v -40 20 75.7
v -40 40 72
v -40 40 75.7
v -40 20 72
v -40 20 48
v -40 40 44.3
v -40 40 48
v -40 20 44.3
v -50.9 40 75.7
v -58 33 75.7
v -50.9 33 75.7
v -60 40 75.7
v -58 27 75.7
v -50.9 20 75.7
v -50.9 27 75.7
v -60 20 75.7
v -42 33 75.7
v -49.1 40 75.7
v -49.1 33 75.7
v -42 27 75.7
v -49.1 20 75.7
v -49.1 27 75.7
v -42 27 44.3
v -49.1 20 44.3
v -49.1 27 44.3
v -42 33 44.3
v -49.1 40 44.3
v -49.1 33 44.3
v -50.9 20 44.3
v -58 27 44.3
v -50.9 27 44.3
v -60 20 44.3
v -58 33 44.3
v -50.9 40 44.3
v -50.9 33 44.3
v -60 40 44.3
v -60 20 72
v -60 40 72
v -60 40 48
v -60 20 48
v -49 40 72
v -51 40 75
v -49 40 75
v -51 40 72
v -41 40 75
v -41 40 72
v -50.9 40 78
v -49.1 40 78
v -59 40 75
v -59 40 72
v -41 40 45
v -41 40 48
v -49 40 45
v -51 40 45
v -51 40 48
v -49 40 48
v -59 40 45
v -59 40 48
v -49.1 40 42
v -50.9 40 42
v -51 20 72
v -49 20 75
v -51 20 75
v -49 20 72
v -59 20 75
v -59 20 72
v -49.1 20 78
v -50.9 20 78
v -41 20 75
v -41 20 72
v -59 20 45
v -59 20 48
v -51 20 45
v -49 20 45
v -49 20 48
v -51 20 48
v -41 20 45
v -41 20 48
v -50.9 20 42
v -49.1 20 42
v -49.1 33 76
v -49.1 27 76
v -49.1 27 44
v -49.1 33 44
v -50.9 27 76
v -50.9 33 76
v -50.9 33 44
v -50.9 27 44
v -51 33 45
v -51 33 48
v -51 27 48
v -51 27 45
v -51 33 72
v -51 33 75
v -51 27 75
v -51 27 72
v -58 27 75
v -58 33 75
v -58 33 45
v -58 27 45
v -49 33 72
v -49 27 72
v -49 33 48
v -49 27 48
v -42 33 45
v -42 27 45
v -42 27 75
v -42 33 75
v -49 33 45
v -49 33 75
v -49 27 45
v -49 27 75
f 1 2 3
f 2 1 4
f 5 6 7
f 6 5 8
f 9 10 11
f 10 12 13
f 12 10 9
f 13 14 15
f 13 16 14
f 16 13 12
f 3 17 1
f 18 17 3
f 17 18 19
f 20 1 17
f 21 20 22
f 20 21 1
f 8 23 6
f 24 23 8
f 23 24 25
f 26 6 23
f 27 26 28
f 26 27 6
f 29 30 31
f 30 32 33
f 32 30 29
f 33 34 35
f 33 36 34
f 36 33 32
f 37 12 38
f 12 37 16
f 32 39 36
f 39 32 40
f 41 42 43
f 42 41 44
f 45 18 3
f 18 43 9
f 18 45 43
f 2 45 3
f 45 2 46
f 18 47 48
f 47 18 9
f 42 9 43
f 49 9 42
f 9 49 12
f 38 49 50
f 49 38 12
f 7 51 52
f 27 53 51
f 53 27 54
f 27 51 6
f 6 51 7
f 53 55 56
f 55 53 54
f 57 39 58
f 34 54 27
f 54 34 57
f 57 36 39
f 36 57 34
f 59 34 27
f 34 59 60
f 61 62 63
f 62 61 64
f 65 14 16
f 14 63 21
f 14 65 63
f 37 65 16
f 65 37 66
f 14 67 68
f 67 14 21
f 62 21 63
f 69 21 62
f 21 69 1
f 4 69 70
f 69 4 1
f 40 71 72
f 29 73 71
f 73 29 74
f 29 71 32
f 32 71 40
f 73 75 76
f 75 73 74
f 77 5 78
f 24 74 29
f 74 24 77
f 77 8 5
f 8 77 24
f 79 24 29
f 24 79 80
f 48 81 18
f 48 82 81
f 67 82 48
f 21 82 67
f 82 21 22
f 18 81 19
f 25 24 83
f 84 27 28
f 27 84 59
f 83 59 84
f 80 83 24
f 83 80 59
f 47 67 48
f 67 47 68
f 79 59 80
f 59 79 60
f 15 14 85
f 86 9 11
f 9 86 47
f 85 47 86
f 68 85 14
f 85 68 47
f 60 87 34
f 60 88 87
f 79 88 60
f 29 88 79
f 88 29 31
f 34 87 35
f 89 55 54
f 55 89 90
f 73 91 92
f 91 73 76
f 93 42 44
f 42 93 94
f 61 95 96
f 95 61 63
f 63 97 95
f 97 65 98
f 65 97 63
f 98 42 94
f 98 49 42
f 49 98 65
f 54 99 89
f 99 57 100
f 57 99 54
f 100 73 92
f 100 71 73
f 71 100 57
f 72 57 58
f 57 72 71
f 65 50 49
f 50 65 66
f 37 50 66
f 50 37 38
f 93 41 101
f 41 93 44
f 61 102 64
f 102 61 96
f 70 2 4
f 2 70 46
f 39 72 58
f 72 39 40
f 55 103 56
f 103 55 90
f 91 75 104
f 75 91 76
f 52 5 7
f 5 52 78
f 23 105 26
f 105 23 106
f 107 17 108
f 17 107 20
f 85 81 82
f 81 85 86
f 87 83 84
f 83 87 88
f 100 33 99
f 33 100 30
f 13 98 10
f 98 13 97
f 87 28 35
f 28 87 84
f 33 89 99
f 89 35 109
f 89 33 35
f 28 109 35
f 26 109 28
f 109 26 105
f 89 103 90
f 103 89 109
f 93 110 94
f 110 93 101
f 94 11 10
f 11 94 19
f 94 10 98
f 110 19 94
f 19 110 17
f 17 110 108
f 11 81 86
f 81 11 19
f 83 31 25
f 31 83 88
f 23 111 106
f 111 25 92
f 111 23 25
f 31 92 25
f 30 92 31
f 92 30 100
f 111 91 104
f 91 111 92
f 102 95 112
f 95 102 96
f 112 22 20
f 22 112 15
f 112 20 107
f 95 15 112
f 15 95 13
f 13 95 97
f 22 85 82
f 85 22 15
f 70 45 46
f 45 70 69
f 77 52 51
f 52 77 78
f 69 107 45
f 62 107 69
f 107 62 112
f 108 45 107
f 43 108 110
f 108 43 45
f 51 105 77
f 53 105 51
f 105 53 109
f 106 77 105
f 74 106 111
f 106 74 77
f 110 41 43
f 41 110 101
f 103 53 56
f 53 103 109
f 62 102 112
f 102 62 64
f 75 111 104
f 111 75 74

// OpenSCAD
module kuangkuang(sizex, sizey, sizez){
    difference(){
    translate([0,0,sizez/2])cube([sizex+2,sizey+2,sizez],center=true);
    translate([0,0,sizez/2])cube([sizex+0.01,sizey+0.01,sizez+0.01],center=true);
    translate([0,0,sizez/2])cube([sizex-6+0.01,sizey+2.01,sizez+0.01],center=true);
    translate([0,0,sizez/2])cube([sizex+2.01,sizey-6+0.01,sizez+0.01],center=true);
    }
}

module addon(){
    difference(){
        cylinder(2, r=4.9,center=true,$fn=50);
        cylinder(2.01, r=2.5,center=true,$fn=50);
        translate([-2.5,-2.5,0])cube([5.1,5.1,2.01],center=true);
        translate([ 2.5, 2.5,0])cube([5.1,5.1,2.01],center=true);
    }
}
module conn(height,degree){
    difference(){
        cube([height,40,20],center=true);
        cube([height-4,36,22],center=true);
        //translate([0,0,1])cube([32,36,18.01],center=true);
        //translate([0,0,5])cube([20,41,10],center=true);
        translate([0, 10,0])rotate([0,90,0])cylinder(40.01, r=2.5,center=true,$fn=50);
        translate([0,-10,0])rotate([0,90,0])cylinder(40.01, r=2.5,center=true,$fn=50);
    }
    translate([-height/2-1, 10,0])rotate([0,90,0])rotate([0,0,degree])addon();
    translate([-height/2-1,-10,0])rotate([0,90,0])rotate([0,0,degree])addon();
    translate([ height/2+1, 10,0])rotate([0,90,0])rotate([0,0,degree])addon();
    translate([ height/2+1,-10,0])rotate([0,90,0])rotate([0,0,degree])addon();
}
module conn_typec(){
    difference(){
    union(){
    conn(40,-45);
    //layer2
    translate([5,0,0])cube([10,40,20],center=true);
    //layer1
    translate([-5,0,0])cube([10,40,20],center=true);
    }

    //layer2
    translate([5.5,-10,9])cube([9.01,4,2.01],center=true);
    translate([5.5,-10,0])cube([9.01,8,16.01],center=true);
    translate([5.5,-10,-9])cube([9.01,4,2.01],center=true);
    translate([5.5, 10, 9])cube([9.01,4,2.01],center=true);
    translate([5.5, 10,0])cube([9.01,8,16.01],center=true);
    translate([5.5, 10,-9])cube([9.01,4,2.01],center=true);

    //layer1
    translate([5.5-10, 0, 0])cube([9.01,36,20.01],center=true);
    }
}
module conn_xh254(){
    difference(){
    union(){
    //+special
    translate([-10,-11,5])cube([20,2,10], center=true);
    //xh254
    translate([0,0,5])cube([40,20,10],center=true);
    //+blank
    translate([0,0,-5])cube([40,20,10],center=true);
    //+main
    rotate([0,90,90])conn(40,-45);
    }

    //-blank
    translate([0,0,-4.5])cube([36,21,9],center=true);

    //-xh254.chargerside
    //.special+++
    translate([-10,9+0.5, 5.5])cube([   6,1.01,9.01],center=true);
    //translate([-10,9+0.5, 9])cube([12.4,1.01,2.01],center=true);
    translate([-10,8+0.5, 5.5])cube([12.4,1.01,9.01],center=true);
    //.special---
    //normal
    translate([-10,  -2+0.5, 5.5])cube([12.4,19,9.01],center=true);
    translate([-10,-12+0.5, 5.5])cube([9,1.01,9.01],center=true);

    //-xh254.batteryside
    translate([ 10,10-3/2, 5+2])cube([6,3.01,6.01],center=true);
    translate([ 10,0, 5+1])cube([8.2,15,8.01],center=true);
    translate([ 10,0-15/2+7/2, 5+1])cube([10.0,7.01,8.01],center=true);
    translate([ 10,0-15/2-0.5, 5+1])cube([8.0,1,8.01],center=true);
    translate([ 10,-9.01, 5.4])cube([13,2,9.21],center=true);
    }
}
module conn_ear(){
    difference(){
        conn(36,-45);
        translate([0,0,5.01])cube([20,40.01,10],center=true);
    }
}

module conn_motor(){
    difference(){
        conn(36,45);
        translate([0,0,5.01])cube([20,40.01,10],center=true);
    }
}

module top_top(){
    /*
    translate([-40, 20, 80-0.5])linear_extrude(height=1.01,center=true)text("-A-",size=20,font= "Arial");
    translate([00, 20, 80-0.5])linear_extrude(height=1.01,center=true)text("-B-",size=20,font= "Arial");
    translate([-40,-40, 80-0.5])linear_extrude(height=1.01,center=true)text("-C-",size=20,font= "Arial");
    translate([00,-40, 80-0.5])linear_extrude(height=1.01,center=true)text("-D-",size=20,font= "Arial");
    */

    difference(){
    union(){
    translate([0, 0, 80-1])cube([120,120,2],center=true);
    }

    //middle
    translate([0, 0, 80-1.11])cube([80,80,1.8],center=true);
    translate([0, 0, 80-1])cube([40,40,3],center=true);

    //hole
    translate([-50,-10,80])cylinder(100, r=5,center=true,$fn=50);
    translate([-50, 10,80])cylinder(100, r=5,center=true,$fn=50);
    translate([ 50,-10,80])cylinder(100, r=5,center=true,$fn=50);
    translate([ 50, 10,80])cylinder(100, r=5,center=true,$fn=50);

    //cam
    translate([-40, 40, 80])cube([20,30,8],center=true);
    translate([ 40, 40, 80])cube([20,30,8],center=true);
    translate([-40,-40, 80])cube([20,30,8],center=true);
    translate([ 40,-40, 80])cube([20,30,8],center=true);
    }

    //speaker
    difference(){
    union(){
    translate([-40, 40, 80-4.5])cube([22,32,9],center=true);
    translate([ 40, 40, 80-4.5])cube([22,32,9],center=true);
    translate([-40,-40, 80-4.5])cube([22,32,9],center=true);
    translate([ 40,-40, 80-4.5])cube([22,32,9],center=true);
    }

    //cam
    translate([-40, 40, 80.01-4])cube([20,30,8],center=true);
    translate([ 40, 40, 80.01-4])cube([20,30,8],center=true);
    translate([-40,-40, 80.01-4])cube([20,30,8],center=true);
    translate([ 40,-40, 80.01-4])cube([20,30,8],center=true);

    //cam
    translate([-40, 40, 80.01-4])cube([10,40,8],center=true);
    translate([ 40, 40, 80.01-4])cube([10,40,8],center=true);
    translate([-40,-40, 80.01-4])cube([10,40,8],center=true);
    translate([ 40,-40, 80.01-4])cube([10,40,8],center=true);
    }
}

module top_support_speaker(){
    difference(){
    union(){
    translate([-50, 30,60])cube([20,20,32-0.6],center=true);
    translate([-50, 30,60])cube([1.8,20,36],center=true);
    }
//
    translate([-50-5, 30,60])cube([8,21,30],center=true);
    translate([-50-5, 30,60])cube([10,21,24],center=true);
//
    translate([-50  , 30,60])cube([16,6,32],center=true);
//
    translate([-50+5, 30,60])cube([8,21,30],center=true);
    translate([-50+5, 30,60])cube([10,21,24],center=true);
    }
}
module top_support_one(){
    difference(){
        conn(36,45);
        //translate([0,0,6])cube([40,24,2],center=true);
    }
    //speaker
    difference(){
        translate([0, 30,0])cube([36,20,20],center=true);
        translate([0, 30,0])cube([40,24,2],center=true);
        translate([0, 30,0])cube([32,20,31],center=true);
    }
    //micphone
    difference(){
    translate([0,-30,0])cube([36,20,20],center=true);
    translate([0,-30,0])cube([40,24,2],center=true);
    translate([0,-30,0])cube([28,20,31],center=true);
    }
}
module top_support(){
    top_support_speaker();
    translate([-50, 0, 60])rotate([0,90,0])top_support_one();
    translate([ 50, 0, 60])rotate([0,-90,0])top_support_one();
}

module rpi(){
difference(){
    union(){
    translate([-24.5,20-62, 1])cylinder(2, r=3,center=true,$fn=50);
    translate([ 24.5,20-62, 1])cylinder(2, r=3,center=true,$fn=50);
    translate([-24.5, 20-4, 1])cylinder(2, r=3,center=true,$fn=50);
    translate([ 24.5, 20-4, 1])cylinder(2, r=3,center=true,$fn=50);
    }
    translate([-24.5,20-62, 1])cylinder(4, r=1.6,center=true,$fn=50);
    translate([ 24.5,20-62, 1])cylinder(4, r=1.6,center=true,$fn=50);
    translate([-24.5, 20-4, 1])cylinder(4, r=1.6,center=true,$fn=50);
    translate([ 24.5, 20-4, 1])cylinder(4, r=1.6,center=true,$fn=50);
}
}
module notprint_rpi(){
translate([0,-20,60])cube([55,88,36-4],center=true);
}

module cam(){
difference(){
    cube([28,28,1.6],center=true);
    //middle
    translate([0,-2,0])cube([12,24,10],center=true);
    //edge
    //translate([-15,15,0])cube([10,4,10],center=true);
    //translate([ 15,15,0])cube([10,4,10],center=true);
    //hole
    translate([-21/2,4-12.5,0])cylinder(110, r=1.2,center=true,$fn=50);
    translate([ 21/2,4-12.5,0])cylinder(110, r=1.2,center=true,$fn=50);
    translate([-21/2, 4,0])cylinder(110, r=1.2,center=true,$fn=50);
    translate([ 21/2, 4,0])cylinder(110, r=1.2,center=true,$fn=50);
}
}
module cam_bottom(){
    difference(){
        translate([0,50,42+2])cube([20,20,4],center=true);
        translate([0,50,42+1.1])cube([50,10,2.2],center=true);
        translate([0,50,0.5])cylinder(100, r=1.6,center=true,$fn=50);
        translate([0,58,42+3])cube([100,2,2],center=true);
    }
}
module cam_mount(){
    translate([0,60-0.8,56])rotate([90,0,0])cam();
    cam_bottom();
}
module top_cam(){
translate([-30,0.0])cam_mount();
translate([ 30,0.0])cam_mount();
}
/*
module top_speaker_l(){
difference(){
    translate([-55, 50,60])cube([10,20,36],center=true);
    translate([-50, 46,61])cube([21,8,30],center=true);
    translate([-50, 60,61])cube([21,20,28],center=true);
    translate([-50,50,43.2])cube([50,10,2.4],center=true);

    translate([-55,50,47])cylinder(4, r=3,center=true,$fn=50);
    translate([-55,50,50])cylinder(30, r=1.6,center=true,$fn=50);

    translate([-52, 46,80])cube([4,8,10],center=true);
}
}
module top_speaker_r(){
difference(){
    translate([ 55, 50,60])cube([10,20,36],center=true);
    translate([ 50, 46,61])cube([21,8,30],center=true);
    translate([ 50, 60,61])cube([21,20,26],center=true);
    translate([ 50,50,43.2])cube([50,10,2.4],center=true);

    translate([ 55,50,47])cylinder(4, r=3,center=true,$fn=50);
    translate([ 55,50,50])cylinder(30, r=1.6,center=true,$fn=50);

    translate([ 52, 46,80])cube([4,8,10],center=true);
}
}
module top_speaker(){
    top_speaker_l();
    top_speaker_r();
}
*/
module inmp441(){
    translate([0,0,1])cube([20,40,2],center=true);
    translate([0,0,2+5])cube([2.54*3,2.54*4,10],center=true);
}
module top_mic(){
translate([ 40,0,60])rotate([0, 90,0])inmp441();
translate([-40,0,60])rotate([0,-90,0])inmp441();
}

module upper_real(){
    //+hole for cam
    difference(){
        translate([0,50,3-0.1])cube([108,9.8,2],center=true);
        for(j=[-50:5:50]){
            translate([j,50,0.5])cylinder(10, r=1.6,center=true,$fn=50);
        }
    }

    //+hole for rpi
    difference(){
        union(){
        translate([-24.5,20-62, 3])cylinder(2, r=4,center=true,$fn=50);
        translate([ 24.5,20-62, 3])cylinder(2, r=4,center=true,$fn=50);
        translate([-24.5, 20-4, 3])cylinder(2, r=4,center=true,$fn=50);
        translate([ 24.5, 20-4, 3])cylinder(2, r=4,center=true,$fn=50);
        }
        translate([-24.5,20-62, 3])cylinder(3, r=1.6,center=true,$fn=50);
        translate([ 24.5,20-62, 3])cylinder(3, r=1.6,center=true,$fn=50);
        translate([-24.5, 20-4, 3])cylinder(3, r=1.6,center=true,$fn=50);
        translate([ 24.5, 20-4, 3])cylinder(3, r=1.6,center=true,$fn=50);
    }

    difference(){
    translate([0,0,2/2])cube([120,120,2],center=true);

    //center
    //translate([0,0,2/2])cube([40,40,3],center=true);

    //leftright
    translate([-35,0,2/2])cube([10,40,3],center=true);
    translate([ 35,0,2/2])cube([10,40,3],center=true);

    //cammount
    for(j=[-50:5:50]){
    //translate([j,50,0.5])cylinder(10, r=1.6,center=true,$fn=50);
    translate([j,50,1])cylinder(2.01, r=3,center=true,$fn=50);
    }

    //rpi
    translate([-24.5,20-62, 1])cylinder(2.01, r=3,center=true,$fn=50);
    translate([ 24.5,20-62, 1])cylinder(2.01, r=3,center=true,$fn=50);
    translate([-24.5, 20-4, 1])cylinder(2.01, r=3,center=true,$fn=50);
    translate([ 24.5, 20-4, 1])cylinder(2.01, r=3,center=true,$fn=50);

    //support hole
    translate([-50,-10,0])cylinder(100, r=5,center=true,$fn=50);
    translate([-50, 10,0])cylinder(100, r=5,center=true,$fn=50);
    translate([ 50,-10,0])cylinder(100, r=5,center=true,$fn=50);
    translate([ 50, 10,0])cylinder(100, r=5,center=true,$fn=50);

    //translate([-20, 20,0])cylinder(100, r=1.6,center=true,$fn=50);
    //translate([  0, 20,0])cylinder(100, r=1.6,center=true,$fn=50);
    //translate([ 20, 20,0])cylinder(100, r=1.6,center=true,$fn=50);

    //marker line
    translate([0,-40,0.1])cube([120,0.2,0.21],center=true);
    translate([0,-20,0.1])cube([120,0.2,0.21],center=true);
    translate([0,  0,0.1])cube([120,0.2,0.21],center=true);
    translate([0, 20,0.1])cube([120,0.2,0.21],center=true);
    translate([0, 40,0.1])cube([120,0.2,0.21],center=true);
    translate([-40,0,0.1])cube([0.2,120,0.21],center=true);
    translate([-20,0,0.1])cube([0.2,120,0.21],center=true);
    translate([  0,0,0.1])cube([0.2,120,0.21],center=true);
    translate([ 20,0,0.1])cube([0.2,120,0.21],center=true);
    translate([ 40,0,0.1])cube([0.2,120,0.21],center=true);

    translate([0,-40,1.9])cube([120,0.2,0.21],center=true);
    translate([0,-20,1.9])cube([120,0.2,0.21],center=true);
    translate([0,  0,1.9])cube([120,0.2,0.21],center=true);
    translate([0, 20,1.9])cube([120,0.2,0.21],center=true);
    translate([0, 40,1.9])cube([120,0.2,0.21],center=true);
    translate([-40,0,1.9])cube([0.2,120,0.21],center=true);
    translate([-20,0,1.9])cube([0.2,120,0.21],center=true);
    translate([  0,0,1.9])cube([0.2,120,0.21],center=true);
    translate([ 20,0,1.9])cube([0.2,120,0.21],center=true);
    translate([ 40,0,1.9])cube([0.2,120,0.21],center=true);
}
}

module top_bot(){
//translate([0,0,2+40+2])rpi();

translate([0,0,40])upper_real();
}

module bezier(h){
linear_extrude(height=h)polygon([
    for(t=[0:0.1:1.0])    [20*t*t, 40*(1-t)*(1-t)],
    [0, 0]
    ]);
}

module batterydock(){
    difference(){
    cube([80,40,40],center=true);
    cube([76,40.02,40.02],center=true);
    }
}

module l298n(){
difference(){
    union(){
        translate([-27.5,20-60,2+2/2])cylinder(2, r=3,center=true,$fn=50);
        translate([ 27.5,20-60,2+2/2])cylinder(2, r=3,center=true,$fn=50);
        translate([-14.5, 20-6,2+2/2])cylinder(2, r=3,center=true,$fn=50);
        translate([ 14.5, 20-6,2+2/2])cylinder(2, r=3,center=true,$fn=50);
    }
        translate([-27.5,20-60,2+2/2])cylinder(10, r=1.6,center=true,$fn=50);
        translate([ 27.5,20-60,2+2/2])cylinder(10, r=1.6,center=true,$fn=50);
        translate([-14.5, 20-6,2+2/2])cylinder(10, r=1.6,center=true,$fn=50);
        translate([ 14.5, 20-6,2+2/2])cylinder(10, r=1.6,center=true,$fn=50);
}
}

module bottom(){
difference(){
    translate([0,0,2/2])cube([120,120,2],center=true);
    translate([0,0,0.6])cube([40, 80, 1.21],center=true);
    translate([0,-40+8,0])cube([40, 16, 10],center=true);
    translate([0, 40-8,0])cube([40, 16, 10],center=true);

    //screw hole
    translate([-50,-10,0])cylinder(100, r=2.5,center=true,$fn=50);
    translate([-50, 10,0])cylinder(100, r=2.5,center=true,$fn=50);
    translate([ 50,-10,0])cylinder(100, r=2.5,center=true,$fn=50);
    translate([ 50, 10,0])cylinder(100, r=2.5,center=true,$fn=50);

    //cable hole
    translate([-40+5/2, 0,0])cube([5,10,30],center=true,$fn=50);
    translate([ 40-5/2, 0,0])cube([5,10,30],center=true,$fn=50);

    //corner
    translate([-50.01,-40.01,2/2])cube([20,40,4],center=true);
    translate([ 50.01,-40.01,2/2])cube([20,40,4],center=true);
    translate([-50.01, 40.01,2/2])cube([20,40,4],center=true);
    translate([ 50.01, 40.01,2/2])cube([20,40,4],center=true);

    //hole
    //translate([-40,-20,0])cylinder(100, r=2.5,center=true,$fn=50);
    //translate([-40, 20,0])cylinder(100, r=2.5,center=true,$fn=50);
    //translate([ 40,-20,0])cylinder(100, r=2.5,center=true,$fn=50);
    //translate([ 40, 20,0])cylinder(100, r=2.5,center=true,$fn=50);

    //translate([-20, 20,0])cylinder(100, r=1.6,center=true,$fn=50);
    //translate([  0, 20,0])cylinder(100, r=1.6,center=true,$fn=50);
    //translate([ 20, 20,0])cylinder(100, r=1.6,center=true,$fn=50);

    //marker line
    translate([0,-40,0.1])cube([120,0.2,0.21],center=true);
    translate([0,-20,0.1])cube([120,0.2,0.21],center=true);
    translate([0,  0,0.1])cube([120,0.2,0.21],center=true);
    translate([0, 20,0.1])cube([120,0.2,0.21],center=true);
    translate([0, 40,0.1])cube([120,0.2,0.21],center=true);
    translate([-40,0,0.1])cube([0.2,120,0.21],center=true);
    translate([-20,0,0.1])cube([0.2,120,0.21],center=true);
    translate([  0,0,0.1])cube([0.2,120,0.21],center=true);
    translate([ 20,0,0.1])cube([0.2,120,0.21],center=true);
    translate([ 40,0,0.1])cube([0.2,120,0.21],center=true);

    translate([0,-40,1.9])cube([120,0.2,0.21],center=true);
    translate([0,-20,1.9])cube([120,0.2,0.21],center=true);
    translate([0,  0,1.9])cube([120,0.2,0.21],center=true);
    translate([0, 20,1.9])cube([120,0.2,0.21],center=true);
    translate([0, 40,1.9])cube([120,0.2,0.21],center=true);
    translate([-40,0,1.9])cube([0.2,120,0.21],center=true);
    translate([-20,0,1.9])cube([0.2,120,0.21],center=true);
    translate([  0,0,1.9])cube([0.2,120,0.21],center=true);
    translate([ 20,0,1.9])cube([0.2,120,0.21],center=true);
    translate([ 40,0,1.9])cube([0.2,120,0.21],center=true);

    //l298
    translate([-27.5,20-60,0.5])cylinder(1.01, r=2.5,center=true,$fn=50);
    translate([ 27.5,20-60,0.5])cylinder(1.01, r=2.5,center=true,$fn=50);
    translate([-14.5,20-6,0.5])cylinder(1.01, r=2.5,center=true,$fn=50);
    translate([ 14.5,20-6,0.5])cylinder(1.01, r=2.5,center=true,$fn=50);

    translate([-27.5,20-60,0])cylinder(10, r=1.6,center=true,$fn=50);
    translate([ 27.5,20-60,0])cylinder(10, r=1.6,center=true,$fn=50);
    translate([-14.5,20-6,0])cylinder(10, r=1.6,center=true,$fn=50);
    translate([ 14.5,20-6,0])cylinder(10, r=1.6,center=true,$fn=50);
}
}

module motorseat(){
difference(){
    translate([0, 0,0])cube([24,120,8],center=true);
    cube([26,70,20],center=true);

    //shaft hole
    translate([0, 60,0])cylinder(20, r=4,center=true,$fn=50);
    translate([0,-60,0])cylinder(20, r=4,center=true,$fn=50);

    //shaft hole
    translate([0, 60-11.5,0])cylinder(20, r=2.2,center=true,$fn=50);
    translate([0,-60+11.5,0])cylinder(20, r=2.2,center=true,$fn=50);

    //screw hole
    translate([-8.6, 60-21,0])cylinder(20, r=1.6,center=true,$fn=50);
    translate([ 8.6, 60-21,0])cylinder(20, r=1.6,center=true,$fn=50);
    translate([-8.6,-60+21,0])cylinder(20, r=1.6,center=true,$fn=50);
    translate([ 8.6,-60+21,0])cylinder(20, r=1.6,center=true,$fn=50);
}
}

module notprint_battery(){
    translate([ 0,40,20])cube([78,40,40],center=true);
}
module notprint_battery2(){
    translate([ 0,-40,20])cube([78,40,40],center=true);
}
module notprint_l298n(){
    translate([ 0,-20,10])cube([60,80,14],center=true);
}

module part2_kuang(){
    //shang
    difference(){
        union(){
        translate([-10, 40,1.2])cube([4,4,2.4],center=true);
        translate([  0, 40,1.2])cube([4,4,2.4],center=true);
        translate([ 10, 40,1.2])cube([4,4,2.4],center=true);
        translate([20,20,0])rotate([0,-90,0])bezier(40);
        translate([0,40,0.5])cube([40,40,1.0],center=true);
        }
        translate([-10,40,0])cylinder(10, r=1.6,center=true,$fn=50);
        translate([  0,40,0])cylinder(10, r=1.6,center=true,$fn=50);
        translate([ 10,40,0])cylinder(10, r=1.6,center=true,$fn=50);
    }
/*
    //zhong
    difference(){
        translate([0,0,10])cube([40,40,20],center=true);
        translate([0,0,10])cube([30,39.9,20.02],center=true);
        translate([0,10,10])rotate([0,90,0])cylinder(100, r=2.5,center=true,$fn=50);
        translate([0,-10,10])rotate([0,90,0])cylinder(100, r=2.5,center=true,$fn=50);
    }
*/
    //xia
    difference(){
        union(){
        translate([-10,-40,1.2])cube([4,4,2.4],center=true);
        translate([  0,-40,1.2])cube([4,4,2.4],center=true);
        translate([ 10,-40,1.2])cube([4,4,2.4],center=true);
        mirror([0,1,0])translate([20,20,0])rotate([0,-90,0])bezier(40);
        translate([0,-40,0.5])cube([40,40,1.0],center=true);
        }
        translate([-10,-40,0])cylinder(10, r=1.6,center=true,$fn=50);
        translate([  0,-40,0])cylinder(10, r=1.6,center=true,$fn=50);
        translate([ 10,-40,0])cylinder(10, r=1.6,center=true,$fn=50);
    }
}
module mid_kuang_right(){
    translate([40,0,20])rotate([0,90,0])part2_kuang();
    translate([50,0,20])rotate([0,0,90])conn_xh254();
}
module mid_kuang_left(){
    translate([-40,0,20])rotate([0,-90,0])part2_kuang();
    translate([-50,0,20])rotate([0,-90,0])conn_typec();
}

module bot_dipan(){
translate([ 0, 0,-2])bottom();
//l298n();

translate([ 40, 20,-2])bezier(2);
translate([ 40,-20,-2])mirror([0,1,0])bezier(2);
translate([-40, 20,-2])mirror([1,0,0])bezier(2);
translate([-40,-20,-2])rotate([0,0,180])bezier(2);
}
module bot_support(){
    translate([-50, 0,-20])rotate([0,90,0])conn_motor();
    translate([ 50, 0,-20])rotate([0,-90,0])conn_motor();
}



module wheel(){
    rotate([0,90,0])cylinder(25, r=65/2,center=true,$fn=50);
}
module notprint_wheel(){
    translate([-60,-60,-20])wheel();
    translate([ 60,-60,-20])wheel();
    translate([-60, 60,-20])wheel();
    translate([ 60, 60,-20])wheel();
}

module screwhelper()
{
difference(){
    cylinder(2, r=3,center=true,$fn=50);
    cylinder(4, r=1.8,center=true,$fn=50);
}
}
module bot_seat_helper()
{
    difference(){
        cube([20,40,6],center=true);

        translate([0,-10, 3-1.1])cylinder(h=2.21,r=5,center=true,$fn=50);
        translate([0,-10,0])cylinder(h=7,r=1.6,center=true,$fn=50);
        translate([0,-10,-3+1.1])cylinder(h=2.21,r=5,center=true,$fn=50);

        translate([0, 10, 3-1.1])cylinder(h=2.21,r=5,center=true,$fn=50);
        translate([0, 10,0])cylinder(h=7,r=1.6,center=true,$fn=50);
        translate([0, 10,-3+1.1])cylinder(h=2.21,r=5,center=true,$fn=50);
    }
}
module bot_seat_left(){
    translate([-30, -40, -2-3])bot_seat_helper();
    translate([-30,  40, -2-3])bot_seat_helper();

    translate([-40+16,0,-20])rotate([0,90,0])motorseat();

    translate([-30, -40, -40+2+3])bot_seat_helper();
    translate([-30,  40, -40+2+3])bot_seat_helper();
}
module bot_seat_right(){
    translate([ 30,  40, -2-3])bot_seat_helper();
    translate([ 30, -40, -2-3])bot_seat_helper();

    translate([ 40-16,0,-20])rotate([0,90,0])motorseat();

    translate([ 30,  40, -40+2+3])bot_seat_helper();
    translate([ 30, -40, -40+2+3])bot_seat_helper();
}
module bot_seat(){
    difference(){
        union(){
            bot_seat_left();
            bot_seat_right();
        }
        translate([0,0,-30])cube([66,66,20],center=true);
    }
}
module bot_power(){
    difference(){
        union(){
        translate([0, 20-1,20])cube([79.6,2,40],center=true);
        //long
        translate([0, 20-1,20])cube([120,2,29.6],center=true);
        //bottom
        translate([0, 20-1,-4])cube([70,2,2+6],center=true);
        //
        translate([-50,10,20])rotate([90,0,0])cylinder(20, r=5,center=true,$fn=50);
        translate([ 50,10,20])rotate([90,0,0])cylinder(20, r=5,center=true,$fn=50);

        //8vto5v +++
        translate([-20, 20-2-10/2,20])cube([20,10,30],center=true);
        //xxxxx
        translate([  0, 20-2-10/2,20])cube([20,10,30],center=true);
        //ads1115 +++
        translate([ 20, 20-2-10/2,20])cube([20,10,30],center=true);
        }
        translate([-50,10,20])rotate([90,0,0])cylinder(25, r=2.5,center=true,$fn=50);
        translate([ 50,10,20])rotate([90,0,0])cylinder(25, r=2.5,center=true,$fn=50);

        //hole.left,right
        translate([-40+2.5, 20-1,20])cube([5,2.01,10],center=true);
        translate([ 40-2.5, 20-1,20])cube([5,2.01,10],center=true);
        //8vto5v ---
        translate([-20, 20-2-10/2,20+30/2-10/2])cube([16,10.01,10],center=true);
        translate([-20, 20-2-8/2,20])cube([16,8,28],center=true);
        translate([-20, 20-2-4/2,5])cube([16,4,10],center=true);
        //xxxxx
        translate([  0, 20-2-10/2+1,20+2])cube([18,8,28],center=true);
        translate([  0, 20-2-10/2-0.01,20])cube([18,10,26],center=true);
        //ads1115 ---
        translate([ 20, 20-2-4/2,35-0.5])cube([18,4,1.01],center=true);
        translate([ 20, 20-2-4/2,20])cube([18,4,28],center=true);
        translate([ 11+1.5, 20-2-5,20+0.5])cube([3,10.01,29],center=true);
    }
}
module bot_l298n(){
    difference(){
        union(){
        translate([0,-20+1,20])cube([79.6,2,40],center=true);
        //long
        translate([0,-20+1,20])cube([120,2,29.6],center=true);
        //bottom
        translate([0,-20+1,-4])cube([70,2,2+6],center=true);
        //
        translate([-50,-10,20])rotate([90,0,0])cylinder(20, r=5,center=true,$fn=50);
        translate([ 50,-10,20])rotate([90,0,0])cylinder(20, r=5,center=true,$fn=50);
        }
        translate([0,0,0])cube([66,36,80.02],center=true);
        translate([0,0,0])cube([80,10,20.02],center=true);

        translate([-50,-10-0.2,20])rotate([90,0,0])cylinder(22, r=2.5,center=true,$fn=50);
        translate([ 50,-10-0.2,20])rotate([90,0,0])cylinder(22, r=2.5,center=true,$fn=50);

        //hole.mid
        translate([0,-20,20])cube([40,20,20],center=true);

        //hole.left,right
        translate([-40+2.5,-20+1,20])cube([5,2.01,10],center=true);
        translate([ 40-2.5,-20+1,20])cube([5,2.01,10],center=true);

        //hole.screw
        translate([-27.5,0,0])rotate([90,0,0])cylinder(100, r=1.6,center=true,$fn=50);
        translate([ 27.5,0,0])rotate([90,0,0])cylinder(100, r=1.6,center=true,$fn=50);
        translate([-14.5,0,40-6])rotate([90,0,0])cylinder(100, r=1.6,center=true,$fn=50);
        translate([ 14.5,0,40-6])rotate([90,0,0])cylinder(100, r=1.6,center=true,$fn=50);
        translate([-27.5,-20+0.5,0])cube([5,1.01,5],center=true);
        translate([ 27.5,-20+0.5,0])cube([5,1.01,5],center=true);
        translate([-14.5,-20+0.5,40-6])cube([5,1.01,5],center=true);
        translate([ 14.5,-20+0.5,40-6])cube([5,1.01,5],center=true);
    }
}

module bot_top(){
    //mid
    difference(){
        union(){
        translate([0, 0, -1])cube([80,120,2],center=true);
        //hole,near
        translate([-30,-30,-3])cylinder(h=2,r=4.9,center=true,$fn=50);
        translate([-30,-50,-3])cylinder(h=2,r=4.9,center=true,$fn=50);
        translate([-10,-30,-3])cylinder(h=2,r=4.9,center=true,$fn=50);
        translate([-10,-50,-3])cylinder(h=2,r=4.9,center=true,$fn=50);
        translate([ 10,-30,-3])cylinder(h=2,r=4.9,center=true,$fn=50);
        translate([ 10,-50,-3])cylinder(h=2,r=4.9,center=true,$fn=50);
        translate([ 30,-30,-3])cylinder(h=2,r=4.9,center=true,$fn=50);
        translate([ 30,-50,-3])cylinder(h=2,r=4.9,center=true,$fn=50);
        //hole,front
        translate([-30, 30,-3])cylinder(h=2,r=4.9,center=true,$fn=50);
        translate([-30, 50,-3])cylinder(h=2,r=4.9,center=true,$fn=50);
        translate([-10, 30,-3])cylinder(h=2,r=4.9,center=true,$fn=50);
        translate([-10, 50,-3])cylinder(h=2,r=4.9,center=true,$fn=50);
        translate([ 10, 30,-3])cylinder(h=2,r=4.9,center=true,$fn=50);
        translate([ 10, 50,-3])cylinder(h=2,r=4.9,center=true,$fn=50);
        translate([ 30, 30,-3])cylinder(h=2,r=4.9,center=true,$fn=50);
        translate([ 30, 50,-3])cylinder(h=2,r=4.9,center=true,$fn=50);
        }
        //hole.near
        translate([-30,-30,-1+0.01])cylinder(h=2,r=3,center=true,$fn=50);
        translate([-30,-50,-1+0.01])cylinder(h=2,r=3,center=true,$fn=50);
        translate([-30,-30,-2])cylinder(h=5,r=1.6,center=true,$fn=50);
        translate([-30,-50,-2])cylinder(h=5,r=1.6,center=true,$fn=50);
        translate([-10,-30,-1+0.01])cylinder(h=2,r=3,center=true,$fn=50);
        translate([-10,-50,-1+0.01])cylinder(h=2,r=3,center=true,$fn=50);
        translate([-10,-30,-2])cylinder(h=5,r=1.6,center=true,$fn=50);
        translate([-10,-50,-2])cylinder(h=5,r=1.6,center=true,$fn=50);
        translate([ 10,-30,-1+0.01])cylinder(h=2,r=3,center=true,$fn=50);
        translate([ 10,-50,-1+0.01])cylinder(h=2,r=3,center=true,$fn=50);
        translate([ 10,-30,-2])cylinder(h=5,r=1.6,center=true,$fn=50);
        translate([ 10,-50,-2])cylinder(h=5,r=1.6,center=true,$fn=50);
        translate([ 30,-30,-1+0.01])cylinder(h=2,r=3,center=true,$fn=50);
        translate([ 30,-50,-1+0.01])cylinder(h=2,r=3,center=true,$fn=50);
        translate([ 30,-30,-2])cylinder(h=5,r=1.6,center=true,$fn=50);
        translate([ 30,-50,-2])cylinder(h=5,r=1.6,center=true,$fn=50);
        //hole,lf
        translate([-30, 30,-1+0.01])cylinder(h=2,r=3,center=true,$fn=50);
        translate([-30, 50,-1+0.01])cylinder(h=2,r=3,center=true,$fn=50);
        translate([-30, 30,-2])cylinder(h=5,r=1.6,center=true,$fn=50);
        translate([-30, 50,-2])cylinder(h=5,r=1.6,center=true,$fn=50);
        translate([-10, 30,-1+0.01])cylinder(h=2,r=3,center=true,$fn=50);
        translate([-10, 50,-1+0.01])cylinder(h=2,r=3,center=true,$fn=50);
        translate([-10, 30,-2])cylinder(h=5,r=1.6,center=true,$fn=50);
        translate([-10, 50,-2])cylinder(h=5,r=1.6,center=true,$fn=50);
        translate([ 10, 30,-1+0.01])cylinder(h=2,r=3,center=true,$fn=50);
        translate([ 10, 50,-1+0.01])cylinder(h=2,r=3,center=true,$fn=50);
        translate([ 10, 30,-2])cylinder(h=5,r=1.6,center=true,$fn=50);
        translate([ 10, 50,-2])cylinder(h=5,r=1.6,center=true,$fn=50);
        translate([ 30, 30,-1+0.01])cylinder(h=2,r=3,center=true,$fn=50);
        translate([ 30, 50,-1+0.01])cylinder(h=2,r=3,center=true,$fn=50);
        translate([ 30, 30,-2])cylinder(h=5,r=1.6,center=true,$fn=50);
        translate([ 30, 50,-2])cylinder(h=5,r=1.6,center=true,$fn=50);
        //hole
        //hole.batt
        translate([0,-40, 0])cube([40,10,10],center=true,$fn=50);
        translate([0, 40, 0])cube([40,10,10],center=true,$fn=50);
        //hole,middle
        translate([0, 0, -1])cube([70,30,10],center=true);
        translate([-40+5/2, 0,0])cube([5.2,30,30],center=true,$fn=50);
        translate([ 40-5/2, 0,0])cube([5.2,30,30],center=true,$fn=50);
        translate([0, 20-2.5,0])cube([40,5.2,30],center=true,$fn=50);
        translate([0,-20+2.5,0])cube([40,5.2,30],center=true,$fn=50);
    }

    //below battery
    difference(){
        union(){
        translate([0, -40, -5])cube([40,40,6],center=true);
        translate([0,  40, -5])cube([40,40,6],center=true);
        }
        translate([0, -40, -5])cube([36,36,6.01],center=true);
        translate([0,  40, -5])cube([36,36,6.01],center=true);
    }

    //left
    difference(){
        translate([-50, 0, -1])cube([20,40,2],center=true);
        translate([-50,-10,0])cylinder(100, r=5,center=true,$fn=50);
        translate([-50, 10,0])cylinder(100, r=5,center=true,$fn=50);
    }
    //right
    difference(){
        translate([ 50, 0, -1])cube([20,40,2],center=true);
        translate([ 50,-10,0])cylinder(100, r=5,center=true,$fn=50);
        translate([ 50, 10,0])cylinder(100, r=5,center=true,$fn=50);
    }

    //corner
    translate([ 40, 20,-8])bezier(8);
    translate([ 40,-20,-8])mirror([0,1,0])bezier(8);
    translate([-40, 20,-8])mirror([1,0,0])bezier(8);
    translate([-40,-20,-8])rotate([0,0,180])bezier(8);
}

module special_board_highhalf_30to40()
{
    //10 to 20
    //translate([0,0,35])cube([40, 40, 10],center=true);
    translate([0, 20-5,40-0.5])cube([40, 10, 1],center=true);
    translate([0, 20-0.5,  35])cube([40, 1, 10],center=true);
    difference(){
    //.bot@20
    translate([0, 20-3,30+0.5])cube([40, 6, 1],center=true);
    //connector
    translate([0, 20-3,31])cube([4, 4, 3],center=true);
    }

    translate([0,-20+5,40-0.5])cube([40, 10, 1],center=true);
    translate([0,-20+0.5,  35])cube([40, 1, 10],center=true);
    difference(){
    //.bot@-20
    translate([0,-20+3,30+0.5])cube([40, 6, 1],center=true);
    //connector
    translate([0,-20+3,31])cube([4, 4, 3],center=true);
    }

    translate([-15, 0,34])kuangkuang(28,20, 6);
    translate([-15, 10+0.5,37])cube([30, 1, 6],center=true);
    translate([-15,-10-0.5,37])cube([30, 1, 6],center=true);
    translate([-15, 0,34+0.5])cube([30, 20, 1],center=true);
}

module special_board_highhalf_20to30()
{
    //connector
    translate([0, 20-3,31])cube([4-0.2, 4-0.2, 3],center=true);
    translate([0,-20+3,31])cube([4-0.2, 4-0.2, 3],center=true);

    //@-20
    translate([0,-20+3,30-0.5])cube([60, 6, 1],center=true);
    difference(){
        translate([0,-20+0.5,25])cube([60, 1, 10],center=true);
    }
    //translate([0,-20+4,20+0.5])cube([60, 8, 1],center=true);

    //@20
    translate([0, 20-3,30-0.5])cube([60, 6, 1],center=true);
    difference(){
        translate([0, 20-0.5,25])cube([60, 1, 10],center=true);
    }
    //translate([0, 20-3,20+0.5])cube([60, 6, 1],center=true);

    //power board
    translate([ 0,0,20])kuangkuang(23*2.54,11*2.54,10);
    difference(){
    translate([0, 0,20+0.5])cube([60, 40, 1],center=true);
    translate([0, 0,20+0.5])cube([40, 30, 1.01],center=true);
    //translate([0, 0,20+0.5])cube([10, 40, 1.01],center=true);
    //connector
    translate([-20+2,-20+3,21])cube([4, 4, 3],center=true);
    translate([ 20-2,-20+3,21])cube([4, 4, 3],center=true);
    translate([-20+2, 20-3,21])cube([4, 4, 3],center=true);
    translate([ 20-2, 20-3,21])cube([4, 4, 3],center=true);
    }
/*
    //connector
    translate([-27.5, -20+3-0.8, 20-5])cube([5, 1.6, 10],center=true);
    translate([-27.5, -20+1, 20-6])rotate([90,0,0])cylinder(2, r=2.4,center=true,$fn=50);
    translate([ 27.5, -20+3-0.8, 20-5])cube([5, 1.6, 10],center=true);
    translate([ 27.5, -20+1, 20-6])rotate([90,0,0])cylinder(2, r=2.4,center=true,$fn=50);
    translate([-27.5,  20-3+0.8, 20-5])cube([5, 1.6, 10],center=true);
    translate([-27.5,  20-1, 20-6])rotate([90,0,0])cylinder(2, r=2.4,center=true,$fn=50);
    translate([ 27.5,  20-3+0.8, 20-5])cube([5, 1.6, 10],center=true);
    translate([ 27.5,  20-1, 20-6])rotate([90,0,0])cylinder(2, r=2.4,center=true,$fn=50);
*/
}

module special_board_highhalf()
{
    //30,40
    translate([-15, 9,30])kuangkuang(28,20, 10);
    difference(){
    translate([-15, 9, 30+0.5])cube([30, 22, 1],center=true);
    }

    //back
    translate([-15, 20-0.5, 20+5])cube([30, 1, 10],center=true);

    //[20,30]
    translate([ 0,5,20])kuangkuang(23*2.54,11*2.54,10);
    difference(){
    translate([0, 0, 20+0.5])cube([80, 40, 1],center=true);
    translate([-35, 0, 20+0.5])cube([10, 20, 2],center=true);
    translate([ 35, 0, 20+0.5])cube([10, 20, 2],center=true);
        //
    translate([0, 0, 20+0.5])cube([50, 20, 2],center=true);
    translate([0, -12, 20+0.5])cube([50, 10, 2],center=true);
    //connector
    translate([-20+2,-20+3,21])cube([4, 4, 3],center=true);
    translate([ 20-2,-20+3,21])cube([4, 4, 3],center=true);
    translate([-20+2, 20-3,21])cube([4, 4, 3],center=true);
    translate([ 20-2, 20-3,21])cube([4, 4, 3],center=true);
    }
}
module special_board_lowhalf()
{/*
    //connector top
    difference(){
    translate([0,-20+1,20])cube([10,2,10],center=true);
    translate([0,-20+1,20])cube([8,3,8],center=true);
    }
    difference(){
    translate([0, 20-1,20])cube([10,2,10],center=true);
    translate([0, 20-1,20])cube([8,3,8],center=true);
    }
    */
    translate([-15,-20+2.5,20-0.5])cube([10, 5, 1],center=true);
    translate([ 15,-20+2.5,20-0.5])cube([10, 5, 1],center=true);
    translate([-20+2,-20+3,21])cube([4-0.2, 4-0.2, 2],center=true);
    translate([ 20-2,-20+3,21])cube([4-0.2, 4-0.2, 2],center=true);

    translate([-15, 20-2.5,20-0.5])cube([10, 5, 1],center=true);
    translate([ 15, 20-2.5,20-0.5])cube([10, 5, 1],center=true);
    translate([-20+2, 20-3,21])cube([4-0.2, 4-0.2, 2],center=true);
    translate([ 20-2, 20-3,21])cube([4-0.2, 4-0.2, 2],center=true);

    //[10,20]
    translate([-20+2.5, 20-5,10-0.5])cube([25, 10, 1],center=true);
    translate([ 20-2.5, 20-5,10-0.5])cube([25, 10, 1],center=true);
    //translate([-30+1, 20-5,20-0.5])cube([2, 10, 1],center=true);
    //translate([ 30-1, 20-5,20-0.5])cube([2, 10, 1],center=true);
    difference(){
        translate([0, 20-5,10])cube([80, 10, 20],center=true);
        translate([0, 20-5,10.5])cube([78, 8, 19.01],center=true);
        //
        translate([-40, 20-5,15])cube([3, 6, 6],center=true);
        translate([ 40, 20-5,15])cube([3, 6, 6],center=true);
        translate([-40, 20-5,10])cube([3, 2, 6],center=true);
        translate([ 40, 20-5,10])cube([3, 2, 6],center=true);
        translate([-40, 20-5,5])cube([3, 8, 8],center=true);
        translate([ 40, 20-5,5])cube([3, 8, 8],center=true);
        //-battery
        translate([0, 20,15])cube([10, 3, 10],center=true);
        //
        translate([0, 20-10,15])cube([60, 2.01, 10.01],center=true);
        //
        translate([-27.5,  20, 20-6])rotate([90,0,0])cylinder(14*2, r=2.5,center=true,$fn=50);
        translate([ 27.5,  20, 20-6])rotate([90,0,0])cylinder(14*2, r=2.5,center=true,$fn=50);
    }

    //[-10,10]
    union(){
        translate([-40+6, 0, 5])cube([2, 20, 10],center=true);
        translate([ 40-6, 0, 5])cube([2, 20, 10],center=true);
    }

    //[-10,10].[6,10]
    //translate([0, 20-12,5])cube([80, 4, 10],center=true);

    //[-10,10].[0,6]:298n
    difference(){
        union(){
        translate([-40+6, 3, 15])cube([2, 6, 10],center=true);
        translate([ 40-6, 3, 15])cube([2, 6, 10],center=true);
        translate([-40+10, 5, 15])cube([10, 2, 10],center=true);
        translate([ 40-10, 5, 15])cube([10, 2, 10],center=true);
        translate([-40+10, 1, 15])cube([10, 2, 10],center=true);
        translate([ 40-10, 1, 15])cube([10, 2, 10],center=true);
        }
        //holes
        translate([-27.5, 3, 20-6])rotate([90,0,0])cylinder(8, r=1.6,center=true,$fn=50);
        translate([ 27.5, 3, 20-6])rotate([90,0,0])cylinder(8, r=1.6,center=true,$fn=50);
    }

    //[-10,10].[-10,0]

    //[-20,-10]
    translate([-20+2.5,-20+5,10-0.5])cube([25, 10, 1],center=true);
    translate([ 20-2.5,-20+5,10-0.5])cube([25, 10, 1],center=true);
    //translate([-30+1, -20+5,20-0.5])cube([2, 10, 1],center=true);
    //translate([ 30-1, -20+5,20-0.5])cube([2, 10, 1],center=true);
    difference(){
        translate([0,-20+5,10])cube([80, 10, 20],center=true);
        translate([0,-20+5,10.5])cube([78, 8, 19.01],center=true);
        //
        translate([-40, -20+5,15])cube([3, 6, 6],center=true);
        translate([ 40, -20+5,15])cube([3, 6, 6],center=true);
        translate([-40, -20+5,10])cube([3, 2, 6],center=true);
        translate([ 40, -20+5,10])cube([3, 2, 6],center=true);
        translate([-40, -20+5,5])cube([3, 8, 8],center=true);
        translate([ 40, -20+5,5])cube([3, 8, 8],center=true);
        //-battery
        translate([0,-20,15])cube([10, 3, 10],center=true);
        //l298.signal
        translate([0,-20+10,15])cube([60, 2.01, 10.01],center=true);
        //
        translate([-8, -20+9, 0])rotate([90,0,0])cylinder(2, r=5,center=true,$fn=50);
        translate([ 8, -20+9, 0])rotate([90,0,0])cylinder(2, r=5,center=true,$fn=50);
        translate([-27.5, -20, 20-6])rotate([90,0,0])cylinder(2*10, r=2.5,center=true,$fn=50);
        translate([ 27.5, -20, 20-6])rotate([90,0,0])cylinder(2*10, r=2.5,center=true,$fn=50);
    }

    //connector bot
    translate([0,-20+2,-2])cube([39.8,4,4],center=true);
    translate([0, 20-2,-2])cube([39.8,4,4],center=true);
}
module special_board()
{
    //special_board_highhalf_30to40();
    //special_board_highhalf_20to30();
    special_board_highhalf();
    //special_board_lowhalf();
}

module bot_bot_mid()
{
    difference(){
    union(){
    //+baseboard
    translate([0, 0, 1])cube([80, 120, 2],center=true);
/*
    //+xt60+xh254
    //translate([0,-50, 5])cube([40, 20, 10],center=true);

    //+l298n
    translate([-29/2, -4, 25/2])cube([11, 6, 25],center=true);
    translate([ 29/2, -4, 25/2])cube([11, 6, 25],center=true);
    translate([-29/2, -5, 5])cube([11, 10, 10],center=true);
    translate([ 29/2, -5, 5])cube([11, 10, 10],center=true);
*/
    //+l298n
    //translate([-29/2, 20-23/2, 2])cube([11, 23, 4],center=true);
    //translate([    0, 20-23/2, 2])cube([4, 23, 4],center=true);
    //translate([ 29/2, 20-23/2, 2])cube([11, 23, 4],center=true);

    //hole,near
    translate([-30,-30,3])cylinder(h=2,r=4.9,center=true,$fn=50);
    translate([-30,-50,3])cylinder(h=2,r=4.9,center=true,$fn=50);
    translate([ 30,-30,3])cylinder(h=2,r=4.9,center=true,$fn=50);
    translate([ 30,-50,3])cylinder(h=2,r=4.9,center=true,$fn=50);
    //hole,front
    translate([-30, 30,3])cylinder(h=2,r=4.9,center=true,$fn=50);
    translate([-30, 50,3])cylinder(h=2,r=4.9,center=true,$fn=50);
    translate([ 30, 30,3])cylinder(h=2,r=4.9,center=true,$fn=50);
    translate([ 30, 50,3])cylinder(h=2,r=4.9,center=true,$fn=50);
    }

    //-heng
    translate([0, 40, 1.91])cube([80,0.2,0.2],center=true);
    translate([0, 20, 1.91])cube([80,0.2,0.2],center=true);
    translate([0,  0, 1.91])cube([80,0.2,0.2],center=true);
    translate([0,-20, 1.91])cube([80,0.2,0.2],center=true);
    translate([0,-40, 1.91])cube([80,0.2,0.2],center=true);
    //heng
    translate([0, 40, 1.91])cube([80,0.2,0.2],center=true);
    translate([0, 20, 1.91])cube([80,0.2,0.2],center=true);
    translate([0,  0, 1.91])cube([80,0.2,0.2],center=true);
    translate([0,-20, 1.91])cube([80,0.2,0.2],center=true);
    translate([0,-40, 1.91])cube([80,0.2,0.2],center=true);
    //-shu
    translate([ 20,0, 1.91])cube([0.2,120,0.2],center=true);
    translate([  0,0, 1.91])cube([0.2,120,0.2],center=true);
    translate([-20,0, 1.91])cube([0.2,120,0.2],center=true);
    //shu
    translate([ 40,0, 1.91])cube([0.2,120,0.2],center=true);
    translate([ 20,0, 1.91])cube([0.2,120,0.2],center=true);
    translate([  0,0, 1.91])cube([0.2,120,0.2],center=true);
    translate([-20,0, 1.91])cube([0.2,120,0.2],center=true);
    translate([-40,0, 1.91])cube([0.2,120,0.2],center=true);

    //-baseboard
    //translate([0, 0, 0])cube([10, 40, 36],center=true);

    //-l298n
    translate([-27.5, 65/2-5,-10])cylinder(100, r=1.6,center=true,$fn=50);
    translate([ 27.5, 65/2-5,-10])cylinder(100, r=1.6,center=true,$fn=50);
    translate([-14.5, 65/2-5,-10])cylinder(100, r=1.6,center=true,$fn=50);
    translate([ 14.5, 65/2-5,-10])cylinder(100, r=1.6,center=true,$fn=50);
    translate([-27.5,-65/2+5,-10])cylinder(100, r=1.6,center=true,$fn=50);
    translate([ 27.5,-65/2+5,-10])cylinder(100, r=1.6,center=true,$fn=50);
    translate([-14.5,-65/2+5,-10])cylinder(100, r=1.6,center=true,$fn=50);
    translate([ 14.5,-65/2+5,-10])cylinder(100, r=1.6,center=true,$fn=50);

    //-holes
    translate([-30, 50,1])cylinder(h=2,r=3,center=true,$fn=50);
    translate([ 30, 50,1])cylinder(h=2,r=3,center=true,$fn=50);
    //translate([-30, 30,1])cylinder(h=2,r=3,center=true,$fn=50);
    //translate([ 30, 30,1])cylinder(h=2,r=3,center=true,$fn=50);
    //translate([-30,-30,1])cylinder(h=2,r=3,center=true,$fn=50);
    //translate([ 30,-30,1])cylinder(h=2,r=3,center=true,$fn=50);
    translate([-30,-50,1])cylinder(h=2,r=3,center=true,$fn=50);
    translate([ 30,-50,1])cylinder(h=2,r=3,center=true,$fn=50);

    //hole,far
    translate([-30,-50,1])cylinder(h=8,r=1.6,center=true,$fn=50);
    translate([-10,-50,1])cylinder(h=8,r=1.6,center=true,$fn=50);
    translate([ 10,-50,1])cylinder(h=8,r=1.6,center=true,$fn=50);
    translate([ 30,-50,1])cylinder(h=8,r=1.6,center=true,$fn=50);
    //hole,near
    translate([-30, 50,1])cylinder(h=8,r=1.6,center=true,$fn=50);
    translate([-10, 50,1])cylinder(h=8,r=1.6,center=true,$fn=50);
    translate([ 10, 50,1])cylinder(h=8,r=1.6,center=true,$fn=50);
    translate([ 30, 50,1])cylinder(h=8,r=1.6,center=true,$fn=50);
    //-xt60
    //translate([-10,-40-2.5, 5+0.5])cube([13,5.01,9.01],center=true);
    //translate([-10,-40-10, 5+0.5])cube([16.4,16.4,9.01],center=true);
    //translate([-10,-40-20+2.5, 5+0.5])cube([14,5.01,9.01],center=true);
/*
    //-xh254.chargerside
    translate([-10,-40-10+0.5, 5+0.5])cube([12.4,19,9.01],center=true);
    translate([-10,-40-20+0.5, 5+0.5])cube([9,1.01,9.01],center=true);

    //-xh254.batteryside
    translate([ 10,-40-3/2, 5+2])cube([7,3.01,6.01],center=true);
    translate([ 10,-40-10, 5+1])cube([8.8,15,8.01],center=true);
    translate([ 10,-40-10-15/2+7/2, 5+1])cube([10.8,7.01,8.01],center=true);
    translate([ 10,-40-10-15/2-0.5, 5+1])cube([8.8,1,8.01],center=true);
    translate([ 10,-40-19.01, 5+0.4])cube([13,2,9.21],center=true);
*/
    }
}
module bot_bot(){
    difference(){
    translate([0,0,-40])bot_bot_mid();
    translate([0,0,-40+2.51])cube([66,66,3],center=true);
    }

    //left
    difference(){
        union(){
        translate([-50, 0, -40+1])cube([20,40,2],center=true);
        }
        translate([-50,-10,-40])cylinder(100, r=5,center=true,$fn=50);
        translate([-50, 10,-40])cylinder(100, r=5,center=true,$fn=50);
    }
    //right
    difference(){
        union(){
        translate([ 50, 0, -40+1])cube([20,40,2],center=true);
        }
        translate([ 50,-10,-40])cylinder(100, r=5,center=true,$fn=50);
        translate([ 50, 10,-40])cylinder(100, r=5,center=true,$fn=50);
    }

    //corner
    translate([ 40, 20,-40])bezier(8);
    translate([ 40,-20,-40])mirror([0,1,0])bezier(8);
    translate([-40, 20,-40])mirror([1,0,0])bezier(8);
    translate([-40,-20,-40])rotate([0,0,180])bezier(8);
}

module temp2(){
/*
    //bulk
    difference(){
    translate([-25, 5, 30])cube([30, 22, 8],center=true);
    translate([-25, 5, 30])cube([40, 20, 6],center=true);
    translate([-25, 5, 35])cube([40, 2, 6],center=true);
    }
*/
    //power wire
    difference(){
    translate([0, 5, 30])cube([60, 30, 20],center=true);
    translate([0, 5, 30])cube([70, 28, 18.01],center=true);
    //
    translate([0, 0, 25+0.5])cube([20, 20, 9],center=true);
    }

    //80x40x30
    //translate([0, -15, 25])cube([10, 10, 10],center=true);
    difference(){
    translate([0, -15, 30])cube([60, 10, 20],center=true);
    translate([0, -15+0.5, 30])cube([48, 9.01, 21],center=true);
    translate([0, -15+0.5, 30])cube([61, 9.01, 18],center=true);
    }
    difference(){
    translate([0, 0, 15])cube([80, 40, 10],center=true);
    translate([0, 0, 25-0.5])cube([90, 38, 29.01],center=true);
    //leftright
    translate([-35, 0, 30])cube([10.01, 40.01, 20.01],center=true);
    translate([ 35, 0, 30])cube([10.01, 40.01, 20.01],center=true);
    //batt
    translate([0, 20-5, 15])cube([10, 10.01, 10.01],center=true);
    translate([0,-20+5, 15])cube([10, 10.01, 10.01],center=true);
    //bot
    //translate([0, 0, 10])cube([80, 20, 4],center=true);
    }

    //l298n
    translate([-40+7.5, 3, 20.5])cube([5, 6, 1],center=true);
    translate([ 40-7.5, 3, 20.5])cube([5, 6, 1],center=true);
    difference(){
        union(){
        translate([-40+6, 3, 15])cube([2, 6, 10],center=true);
        translate([ 40-6, 3, 15])cube([2, 6, 10],center=true);
        translate([-40+10, 5, 15])cube([10, 2, 10],center=true);
        translate([ 40-10, 5, 15])cube([10, 2, 10],center=true);
        translate([-40+10, 1, 15])cube([10, 2, 10],center=true);
        translate([ 40-10, 1, 15])cube([10, 2, 10],center=true);
        }
        //holes
        translate([-27.5, 3, 20-6])rotate([90,0,0])cylinder(8, r=1.6,center=true,$fn=50);
        translate([ 27.5, 3, 20-6])rotate([90,0,0])cylinder(8, r=1.6,center=true,$fn=50);
    }

    //bot
    translate([-34, 3, 5])cube([2, 6, 10],center=true);
    translate([ 34, 3, 5])cube([2, 6, 10],center=true);
    difference(){
    translate([0, 0, 5])cube([80, 40, 10],center=true);
    translate([0, 0, 5])cube([66, 20, 10.01],center=true);
    //leftright
    translate([-35, 0, 5.5])cube([10.01, 38, 9.01],center=true);
    translate([ 35, 0, 5.5])cube([10.01, 38, 9.01],center=true);
    //batt wire
    translate([0,-20+5, 5])cube([81, 8, 8.01],center=true);
    translate([0, 20-5, 5])cube([81, 8, 8.01],center=true);
    //batt
    translate([0,-20+2.5, 5])cube([8, 5.01, 10.01],center=true);
    translate([0, 20-2.5, 5])cube([8, 5.01, 10.01],center=true);
    //
    translate([-(8+24)/2,-20+5.5, 5])cube([24-8, 9, 11],center=true);
    translate([ (8+24)/2,-20+5.5, 5])cube([24-8, 9, 11],center=true);
    translate([-8, -20+9, 0])rotate([90,0,0])cylinder(2, r=5,center=true,$fn=50);
    translate([ 8, -20+9, 0])rotate([90,0,0])cylinder(2, r=5,center=true,$fn=50);
    /*
    translate([-27.5, -20, 20-6])rotate([90,0,0])cylinder(2*10, r=2.5,center=true,$fn=50);
    translate([ 27.5, -20, 20-6])rotate([90,0,0])cylinder(2*10, r=2.5,center=true,$fn=50);
    */
    }
}
module temp(){
    difference(){
    translate([0, 0, 20])cube([80, 40, 40],center=true);
    //mid top,center
    translate([0,   0, 30])cube([41, 16, 20.01],center=true);
    translate([0,   0, 10.5])cube([41, 16, 19],center=true);
    //mid near,far
    translate([0,  14, 20])cube([41, 10, 38],center=true);
    translate([0, -14, 20])cube([41, 10, 38],center=true);
    //n,f batt
    translate([0,-20, 20])cube([10, 10, 40],center=true);
    translate([0, 20, 20])cube([10, 10, 40],center=true);
    //l,r vertical
    translate([-40, 0, 20])cube([4, 30, 30],center=true);
    translate([ 40, 0, 20])cube([4, 30, 30],center=true);
    //l,r edge
    translate([-30+0.5, 0, 20])cube([19, 38, 50],center=true);
    translate([ 30-0.5, 0, 20])cube([19, 38, 50],center=true);
    //bot
    translate([ 0, 0, 0])cube([10, 16, 15],center=true);
    }
    difference(){
    translate([0, 0, 10])cube([60, 18, 20],center=true);
    translate([0, 0, 10.51])cube([58, 16, 19],center=true);
    translate([ 0, 0, 0])cube([10, 16, 15],center=true);
    }
}



/*
color("#ffff00")translate([0,0,80])cube([2,200,0.00000001],center=true);
color("#ffff00")translate([0,0,80])cube([200,2,0.00000001],center=true);

color("#ff00ff")translate([0,0,40])cube([2,200,0.00000001],center=true);
color("#ff00ff")translate([0,0,40])cube([200,2,0.00000001],center=true);

color("#ff00ff")cube([2,200,0.00000001],center=true);
color("#ff00ff")cube([200,2,0.00000001],center=true);

color("#ffff00")translate([0,0,-40])cube([2,200,0.00000001],center=true);
color("#ffff00")translate([0,0,-40])cube([200,2,0.00000001],center=true);
*/


//--------for preview--------
/*
//top
color("#ff0000")top_top();
color("#ff0000")top_cam();
color("#ff0000")top_mic();
color("#ff0000")top_support();
color("#ff0000")top_bot();

//mid
color("#00ffff")special_board();
//notprint_battery();
//notprint_battery2();
color([0.0,0.9,0.9,0.8])mid_kuang_right();
color("#00ff00")mid_kuang_left();

//bot
color("#ffff00")bot_top();
color([0.5,0.5,0,0.9])bot_support();
color([0.5,0.5,0,0.5])bot_seat();
color([0.5,0,0.5,0.8])bot_bot();
//notprint_wheel();
*/


//--------for print--------
//rotate([-180,0,0])top_top();
//rotate([-90,0,0])cam_mount();
//rotate([0,-90,0])top_speaker_l();
//top_mic();
top_support_speaker();
//top_support_one();
//top_bot();

//mid_kuang_left();
//mid_kuang_right();
//special_board_lowhalf();
//temp();

//mirror([0,0,1])bot_top();

//conn_motor();
//rotate([0,90,0])bot_seat_left();
/*
difference(){
    bot_seat();
    translate([100,0,0])cube([200,200,100],center=true);
}
*/
//bot_bot();


//--------for test--------
//cam_mount();
//top_speaker();
//screwhelper();
//screwhelper();
//conn_xh254();
//kuangkuang(20,30,10);


//--------for delete--------
//special_support();
//special_back();
//zhuomian();
//special_zhicheng();
//rotate([90,0,0])bot_l298n();
//rotate([-90,0,0])bot_power();
